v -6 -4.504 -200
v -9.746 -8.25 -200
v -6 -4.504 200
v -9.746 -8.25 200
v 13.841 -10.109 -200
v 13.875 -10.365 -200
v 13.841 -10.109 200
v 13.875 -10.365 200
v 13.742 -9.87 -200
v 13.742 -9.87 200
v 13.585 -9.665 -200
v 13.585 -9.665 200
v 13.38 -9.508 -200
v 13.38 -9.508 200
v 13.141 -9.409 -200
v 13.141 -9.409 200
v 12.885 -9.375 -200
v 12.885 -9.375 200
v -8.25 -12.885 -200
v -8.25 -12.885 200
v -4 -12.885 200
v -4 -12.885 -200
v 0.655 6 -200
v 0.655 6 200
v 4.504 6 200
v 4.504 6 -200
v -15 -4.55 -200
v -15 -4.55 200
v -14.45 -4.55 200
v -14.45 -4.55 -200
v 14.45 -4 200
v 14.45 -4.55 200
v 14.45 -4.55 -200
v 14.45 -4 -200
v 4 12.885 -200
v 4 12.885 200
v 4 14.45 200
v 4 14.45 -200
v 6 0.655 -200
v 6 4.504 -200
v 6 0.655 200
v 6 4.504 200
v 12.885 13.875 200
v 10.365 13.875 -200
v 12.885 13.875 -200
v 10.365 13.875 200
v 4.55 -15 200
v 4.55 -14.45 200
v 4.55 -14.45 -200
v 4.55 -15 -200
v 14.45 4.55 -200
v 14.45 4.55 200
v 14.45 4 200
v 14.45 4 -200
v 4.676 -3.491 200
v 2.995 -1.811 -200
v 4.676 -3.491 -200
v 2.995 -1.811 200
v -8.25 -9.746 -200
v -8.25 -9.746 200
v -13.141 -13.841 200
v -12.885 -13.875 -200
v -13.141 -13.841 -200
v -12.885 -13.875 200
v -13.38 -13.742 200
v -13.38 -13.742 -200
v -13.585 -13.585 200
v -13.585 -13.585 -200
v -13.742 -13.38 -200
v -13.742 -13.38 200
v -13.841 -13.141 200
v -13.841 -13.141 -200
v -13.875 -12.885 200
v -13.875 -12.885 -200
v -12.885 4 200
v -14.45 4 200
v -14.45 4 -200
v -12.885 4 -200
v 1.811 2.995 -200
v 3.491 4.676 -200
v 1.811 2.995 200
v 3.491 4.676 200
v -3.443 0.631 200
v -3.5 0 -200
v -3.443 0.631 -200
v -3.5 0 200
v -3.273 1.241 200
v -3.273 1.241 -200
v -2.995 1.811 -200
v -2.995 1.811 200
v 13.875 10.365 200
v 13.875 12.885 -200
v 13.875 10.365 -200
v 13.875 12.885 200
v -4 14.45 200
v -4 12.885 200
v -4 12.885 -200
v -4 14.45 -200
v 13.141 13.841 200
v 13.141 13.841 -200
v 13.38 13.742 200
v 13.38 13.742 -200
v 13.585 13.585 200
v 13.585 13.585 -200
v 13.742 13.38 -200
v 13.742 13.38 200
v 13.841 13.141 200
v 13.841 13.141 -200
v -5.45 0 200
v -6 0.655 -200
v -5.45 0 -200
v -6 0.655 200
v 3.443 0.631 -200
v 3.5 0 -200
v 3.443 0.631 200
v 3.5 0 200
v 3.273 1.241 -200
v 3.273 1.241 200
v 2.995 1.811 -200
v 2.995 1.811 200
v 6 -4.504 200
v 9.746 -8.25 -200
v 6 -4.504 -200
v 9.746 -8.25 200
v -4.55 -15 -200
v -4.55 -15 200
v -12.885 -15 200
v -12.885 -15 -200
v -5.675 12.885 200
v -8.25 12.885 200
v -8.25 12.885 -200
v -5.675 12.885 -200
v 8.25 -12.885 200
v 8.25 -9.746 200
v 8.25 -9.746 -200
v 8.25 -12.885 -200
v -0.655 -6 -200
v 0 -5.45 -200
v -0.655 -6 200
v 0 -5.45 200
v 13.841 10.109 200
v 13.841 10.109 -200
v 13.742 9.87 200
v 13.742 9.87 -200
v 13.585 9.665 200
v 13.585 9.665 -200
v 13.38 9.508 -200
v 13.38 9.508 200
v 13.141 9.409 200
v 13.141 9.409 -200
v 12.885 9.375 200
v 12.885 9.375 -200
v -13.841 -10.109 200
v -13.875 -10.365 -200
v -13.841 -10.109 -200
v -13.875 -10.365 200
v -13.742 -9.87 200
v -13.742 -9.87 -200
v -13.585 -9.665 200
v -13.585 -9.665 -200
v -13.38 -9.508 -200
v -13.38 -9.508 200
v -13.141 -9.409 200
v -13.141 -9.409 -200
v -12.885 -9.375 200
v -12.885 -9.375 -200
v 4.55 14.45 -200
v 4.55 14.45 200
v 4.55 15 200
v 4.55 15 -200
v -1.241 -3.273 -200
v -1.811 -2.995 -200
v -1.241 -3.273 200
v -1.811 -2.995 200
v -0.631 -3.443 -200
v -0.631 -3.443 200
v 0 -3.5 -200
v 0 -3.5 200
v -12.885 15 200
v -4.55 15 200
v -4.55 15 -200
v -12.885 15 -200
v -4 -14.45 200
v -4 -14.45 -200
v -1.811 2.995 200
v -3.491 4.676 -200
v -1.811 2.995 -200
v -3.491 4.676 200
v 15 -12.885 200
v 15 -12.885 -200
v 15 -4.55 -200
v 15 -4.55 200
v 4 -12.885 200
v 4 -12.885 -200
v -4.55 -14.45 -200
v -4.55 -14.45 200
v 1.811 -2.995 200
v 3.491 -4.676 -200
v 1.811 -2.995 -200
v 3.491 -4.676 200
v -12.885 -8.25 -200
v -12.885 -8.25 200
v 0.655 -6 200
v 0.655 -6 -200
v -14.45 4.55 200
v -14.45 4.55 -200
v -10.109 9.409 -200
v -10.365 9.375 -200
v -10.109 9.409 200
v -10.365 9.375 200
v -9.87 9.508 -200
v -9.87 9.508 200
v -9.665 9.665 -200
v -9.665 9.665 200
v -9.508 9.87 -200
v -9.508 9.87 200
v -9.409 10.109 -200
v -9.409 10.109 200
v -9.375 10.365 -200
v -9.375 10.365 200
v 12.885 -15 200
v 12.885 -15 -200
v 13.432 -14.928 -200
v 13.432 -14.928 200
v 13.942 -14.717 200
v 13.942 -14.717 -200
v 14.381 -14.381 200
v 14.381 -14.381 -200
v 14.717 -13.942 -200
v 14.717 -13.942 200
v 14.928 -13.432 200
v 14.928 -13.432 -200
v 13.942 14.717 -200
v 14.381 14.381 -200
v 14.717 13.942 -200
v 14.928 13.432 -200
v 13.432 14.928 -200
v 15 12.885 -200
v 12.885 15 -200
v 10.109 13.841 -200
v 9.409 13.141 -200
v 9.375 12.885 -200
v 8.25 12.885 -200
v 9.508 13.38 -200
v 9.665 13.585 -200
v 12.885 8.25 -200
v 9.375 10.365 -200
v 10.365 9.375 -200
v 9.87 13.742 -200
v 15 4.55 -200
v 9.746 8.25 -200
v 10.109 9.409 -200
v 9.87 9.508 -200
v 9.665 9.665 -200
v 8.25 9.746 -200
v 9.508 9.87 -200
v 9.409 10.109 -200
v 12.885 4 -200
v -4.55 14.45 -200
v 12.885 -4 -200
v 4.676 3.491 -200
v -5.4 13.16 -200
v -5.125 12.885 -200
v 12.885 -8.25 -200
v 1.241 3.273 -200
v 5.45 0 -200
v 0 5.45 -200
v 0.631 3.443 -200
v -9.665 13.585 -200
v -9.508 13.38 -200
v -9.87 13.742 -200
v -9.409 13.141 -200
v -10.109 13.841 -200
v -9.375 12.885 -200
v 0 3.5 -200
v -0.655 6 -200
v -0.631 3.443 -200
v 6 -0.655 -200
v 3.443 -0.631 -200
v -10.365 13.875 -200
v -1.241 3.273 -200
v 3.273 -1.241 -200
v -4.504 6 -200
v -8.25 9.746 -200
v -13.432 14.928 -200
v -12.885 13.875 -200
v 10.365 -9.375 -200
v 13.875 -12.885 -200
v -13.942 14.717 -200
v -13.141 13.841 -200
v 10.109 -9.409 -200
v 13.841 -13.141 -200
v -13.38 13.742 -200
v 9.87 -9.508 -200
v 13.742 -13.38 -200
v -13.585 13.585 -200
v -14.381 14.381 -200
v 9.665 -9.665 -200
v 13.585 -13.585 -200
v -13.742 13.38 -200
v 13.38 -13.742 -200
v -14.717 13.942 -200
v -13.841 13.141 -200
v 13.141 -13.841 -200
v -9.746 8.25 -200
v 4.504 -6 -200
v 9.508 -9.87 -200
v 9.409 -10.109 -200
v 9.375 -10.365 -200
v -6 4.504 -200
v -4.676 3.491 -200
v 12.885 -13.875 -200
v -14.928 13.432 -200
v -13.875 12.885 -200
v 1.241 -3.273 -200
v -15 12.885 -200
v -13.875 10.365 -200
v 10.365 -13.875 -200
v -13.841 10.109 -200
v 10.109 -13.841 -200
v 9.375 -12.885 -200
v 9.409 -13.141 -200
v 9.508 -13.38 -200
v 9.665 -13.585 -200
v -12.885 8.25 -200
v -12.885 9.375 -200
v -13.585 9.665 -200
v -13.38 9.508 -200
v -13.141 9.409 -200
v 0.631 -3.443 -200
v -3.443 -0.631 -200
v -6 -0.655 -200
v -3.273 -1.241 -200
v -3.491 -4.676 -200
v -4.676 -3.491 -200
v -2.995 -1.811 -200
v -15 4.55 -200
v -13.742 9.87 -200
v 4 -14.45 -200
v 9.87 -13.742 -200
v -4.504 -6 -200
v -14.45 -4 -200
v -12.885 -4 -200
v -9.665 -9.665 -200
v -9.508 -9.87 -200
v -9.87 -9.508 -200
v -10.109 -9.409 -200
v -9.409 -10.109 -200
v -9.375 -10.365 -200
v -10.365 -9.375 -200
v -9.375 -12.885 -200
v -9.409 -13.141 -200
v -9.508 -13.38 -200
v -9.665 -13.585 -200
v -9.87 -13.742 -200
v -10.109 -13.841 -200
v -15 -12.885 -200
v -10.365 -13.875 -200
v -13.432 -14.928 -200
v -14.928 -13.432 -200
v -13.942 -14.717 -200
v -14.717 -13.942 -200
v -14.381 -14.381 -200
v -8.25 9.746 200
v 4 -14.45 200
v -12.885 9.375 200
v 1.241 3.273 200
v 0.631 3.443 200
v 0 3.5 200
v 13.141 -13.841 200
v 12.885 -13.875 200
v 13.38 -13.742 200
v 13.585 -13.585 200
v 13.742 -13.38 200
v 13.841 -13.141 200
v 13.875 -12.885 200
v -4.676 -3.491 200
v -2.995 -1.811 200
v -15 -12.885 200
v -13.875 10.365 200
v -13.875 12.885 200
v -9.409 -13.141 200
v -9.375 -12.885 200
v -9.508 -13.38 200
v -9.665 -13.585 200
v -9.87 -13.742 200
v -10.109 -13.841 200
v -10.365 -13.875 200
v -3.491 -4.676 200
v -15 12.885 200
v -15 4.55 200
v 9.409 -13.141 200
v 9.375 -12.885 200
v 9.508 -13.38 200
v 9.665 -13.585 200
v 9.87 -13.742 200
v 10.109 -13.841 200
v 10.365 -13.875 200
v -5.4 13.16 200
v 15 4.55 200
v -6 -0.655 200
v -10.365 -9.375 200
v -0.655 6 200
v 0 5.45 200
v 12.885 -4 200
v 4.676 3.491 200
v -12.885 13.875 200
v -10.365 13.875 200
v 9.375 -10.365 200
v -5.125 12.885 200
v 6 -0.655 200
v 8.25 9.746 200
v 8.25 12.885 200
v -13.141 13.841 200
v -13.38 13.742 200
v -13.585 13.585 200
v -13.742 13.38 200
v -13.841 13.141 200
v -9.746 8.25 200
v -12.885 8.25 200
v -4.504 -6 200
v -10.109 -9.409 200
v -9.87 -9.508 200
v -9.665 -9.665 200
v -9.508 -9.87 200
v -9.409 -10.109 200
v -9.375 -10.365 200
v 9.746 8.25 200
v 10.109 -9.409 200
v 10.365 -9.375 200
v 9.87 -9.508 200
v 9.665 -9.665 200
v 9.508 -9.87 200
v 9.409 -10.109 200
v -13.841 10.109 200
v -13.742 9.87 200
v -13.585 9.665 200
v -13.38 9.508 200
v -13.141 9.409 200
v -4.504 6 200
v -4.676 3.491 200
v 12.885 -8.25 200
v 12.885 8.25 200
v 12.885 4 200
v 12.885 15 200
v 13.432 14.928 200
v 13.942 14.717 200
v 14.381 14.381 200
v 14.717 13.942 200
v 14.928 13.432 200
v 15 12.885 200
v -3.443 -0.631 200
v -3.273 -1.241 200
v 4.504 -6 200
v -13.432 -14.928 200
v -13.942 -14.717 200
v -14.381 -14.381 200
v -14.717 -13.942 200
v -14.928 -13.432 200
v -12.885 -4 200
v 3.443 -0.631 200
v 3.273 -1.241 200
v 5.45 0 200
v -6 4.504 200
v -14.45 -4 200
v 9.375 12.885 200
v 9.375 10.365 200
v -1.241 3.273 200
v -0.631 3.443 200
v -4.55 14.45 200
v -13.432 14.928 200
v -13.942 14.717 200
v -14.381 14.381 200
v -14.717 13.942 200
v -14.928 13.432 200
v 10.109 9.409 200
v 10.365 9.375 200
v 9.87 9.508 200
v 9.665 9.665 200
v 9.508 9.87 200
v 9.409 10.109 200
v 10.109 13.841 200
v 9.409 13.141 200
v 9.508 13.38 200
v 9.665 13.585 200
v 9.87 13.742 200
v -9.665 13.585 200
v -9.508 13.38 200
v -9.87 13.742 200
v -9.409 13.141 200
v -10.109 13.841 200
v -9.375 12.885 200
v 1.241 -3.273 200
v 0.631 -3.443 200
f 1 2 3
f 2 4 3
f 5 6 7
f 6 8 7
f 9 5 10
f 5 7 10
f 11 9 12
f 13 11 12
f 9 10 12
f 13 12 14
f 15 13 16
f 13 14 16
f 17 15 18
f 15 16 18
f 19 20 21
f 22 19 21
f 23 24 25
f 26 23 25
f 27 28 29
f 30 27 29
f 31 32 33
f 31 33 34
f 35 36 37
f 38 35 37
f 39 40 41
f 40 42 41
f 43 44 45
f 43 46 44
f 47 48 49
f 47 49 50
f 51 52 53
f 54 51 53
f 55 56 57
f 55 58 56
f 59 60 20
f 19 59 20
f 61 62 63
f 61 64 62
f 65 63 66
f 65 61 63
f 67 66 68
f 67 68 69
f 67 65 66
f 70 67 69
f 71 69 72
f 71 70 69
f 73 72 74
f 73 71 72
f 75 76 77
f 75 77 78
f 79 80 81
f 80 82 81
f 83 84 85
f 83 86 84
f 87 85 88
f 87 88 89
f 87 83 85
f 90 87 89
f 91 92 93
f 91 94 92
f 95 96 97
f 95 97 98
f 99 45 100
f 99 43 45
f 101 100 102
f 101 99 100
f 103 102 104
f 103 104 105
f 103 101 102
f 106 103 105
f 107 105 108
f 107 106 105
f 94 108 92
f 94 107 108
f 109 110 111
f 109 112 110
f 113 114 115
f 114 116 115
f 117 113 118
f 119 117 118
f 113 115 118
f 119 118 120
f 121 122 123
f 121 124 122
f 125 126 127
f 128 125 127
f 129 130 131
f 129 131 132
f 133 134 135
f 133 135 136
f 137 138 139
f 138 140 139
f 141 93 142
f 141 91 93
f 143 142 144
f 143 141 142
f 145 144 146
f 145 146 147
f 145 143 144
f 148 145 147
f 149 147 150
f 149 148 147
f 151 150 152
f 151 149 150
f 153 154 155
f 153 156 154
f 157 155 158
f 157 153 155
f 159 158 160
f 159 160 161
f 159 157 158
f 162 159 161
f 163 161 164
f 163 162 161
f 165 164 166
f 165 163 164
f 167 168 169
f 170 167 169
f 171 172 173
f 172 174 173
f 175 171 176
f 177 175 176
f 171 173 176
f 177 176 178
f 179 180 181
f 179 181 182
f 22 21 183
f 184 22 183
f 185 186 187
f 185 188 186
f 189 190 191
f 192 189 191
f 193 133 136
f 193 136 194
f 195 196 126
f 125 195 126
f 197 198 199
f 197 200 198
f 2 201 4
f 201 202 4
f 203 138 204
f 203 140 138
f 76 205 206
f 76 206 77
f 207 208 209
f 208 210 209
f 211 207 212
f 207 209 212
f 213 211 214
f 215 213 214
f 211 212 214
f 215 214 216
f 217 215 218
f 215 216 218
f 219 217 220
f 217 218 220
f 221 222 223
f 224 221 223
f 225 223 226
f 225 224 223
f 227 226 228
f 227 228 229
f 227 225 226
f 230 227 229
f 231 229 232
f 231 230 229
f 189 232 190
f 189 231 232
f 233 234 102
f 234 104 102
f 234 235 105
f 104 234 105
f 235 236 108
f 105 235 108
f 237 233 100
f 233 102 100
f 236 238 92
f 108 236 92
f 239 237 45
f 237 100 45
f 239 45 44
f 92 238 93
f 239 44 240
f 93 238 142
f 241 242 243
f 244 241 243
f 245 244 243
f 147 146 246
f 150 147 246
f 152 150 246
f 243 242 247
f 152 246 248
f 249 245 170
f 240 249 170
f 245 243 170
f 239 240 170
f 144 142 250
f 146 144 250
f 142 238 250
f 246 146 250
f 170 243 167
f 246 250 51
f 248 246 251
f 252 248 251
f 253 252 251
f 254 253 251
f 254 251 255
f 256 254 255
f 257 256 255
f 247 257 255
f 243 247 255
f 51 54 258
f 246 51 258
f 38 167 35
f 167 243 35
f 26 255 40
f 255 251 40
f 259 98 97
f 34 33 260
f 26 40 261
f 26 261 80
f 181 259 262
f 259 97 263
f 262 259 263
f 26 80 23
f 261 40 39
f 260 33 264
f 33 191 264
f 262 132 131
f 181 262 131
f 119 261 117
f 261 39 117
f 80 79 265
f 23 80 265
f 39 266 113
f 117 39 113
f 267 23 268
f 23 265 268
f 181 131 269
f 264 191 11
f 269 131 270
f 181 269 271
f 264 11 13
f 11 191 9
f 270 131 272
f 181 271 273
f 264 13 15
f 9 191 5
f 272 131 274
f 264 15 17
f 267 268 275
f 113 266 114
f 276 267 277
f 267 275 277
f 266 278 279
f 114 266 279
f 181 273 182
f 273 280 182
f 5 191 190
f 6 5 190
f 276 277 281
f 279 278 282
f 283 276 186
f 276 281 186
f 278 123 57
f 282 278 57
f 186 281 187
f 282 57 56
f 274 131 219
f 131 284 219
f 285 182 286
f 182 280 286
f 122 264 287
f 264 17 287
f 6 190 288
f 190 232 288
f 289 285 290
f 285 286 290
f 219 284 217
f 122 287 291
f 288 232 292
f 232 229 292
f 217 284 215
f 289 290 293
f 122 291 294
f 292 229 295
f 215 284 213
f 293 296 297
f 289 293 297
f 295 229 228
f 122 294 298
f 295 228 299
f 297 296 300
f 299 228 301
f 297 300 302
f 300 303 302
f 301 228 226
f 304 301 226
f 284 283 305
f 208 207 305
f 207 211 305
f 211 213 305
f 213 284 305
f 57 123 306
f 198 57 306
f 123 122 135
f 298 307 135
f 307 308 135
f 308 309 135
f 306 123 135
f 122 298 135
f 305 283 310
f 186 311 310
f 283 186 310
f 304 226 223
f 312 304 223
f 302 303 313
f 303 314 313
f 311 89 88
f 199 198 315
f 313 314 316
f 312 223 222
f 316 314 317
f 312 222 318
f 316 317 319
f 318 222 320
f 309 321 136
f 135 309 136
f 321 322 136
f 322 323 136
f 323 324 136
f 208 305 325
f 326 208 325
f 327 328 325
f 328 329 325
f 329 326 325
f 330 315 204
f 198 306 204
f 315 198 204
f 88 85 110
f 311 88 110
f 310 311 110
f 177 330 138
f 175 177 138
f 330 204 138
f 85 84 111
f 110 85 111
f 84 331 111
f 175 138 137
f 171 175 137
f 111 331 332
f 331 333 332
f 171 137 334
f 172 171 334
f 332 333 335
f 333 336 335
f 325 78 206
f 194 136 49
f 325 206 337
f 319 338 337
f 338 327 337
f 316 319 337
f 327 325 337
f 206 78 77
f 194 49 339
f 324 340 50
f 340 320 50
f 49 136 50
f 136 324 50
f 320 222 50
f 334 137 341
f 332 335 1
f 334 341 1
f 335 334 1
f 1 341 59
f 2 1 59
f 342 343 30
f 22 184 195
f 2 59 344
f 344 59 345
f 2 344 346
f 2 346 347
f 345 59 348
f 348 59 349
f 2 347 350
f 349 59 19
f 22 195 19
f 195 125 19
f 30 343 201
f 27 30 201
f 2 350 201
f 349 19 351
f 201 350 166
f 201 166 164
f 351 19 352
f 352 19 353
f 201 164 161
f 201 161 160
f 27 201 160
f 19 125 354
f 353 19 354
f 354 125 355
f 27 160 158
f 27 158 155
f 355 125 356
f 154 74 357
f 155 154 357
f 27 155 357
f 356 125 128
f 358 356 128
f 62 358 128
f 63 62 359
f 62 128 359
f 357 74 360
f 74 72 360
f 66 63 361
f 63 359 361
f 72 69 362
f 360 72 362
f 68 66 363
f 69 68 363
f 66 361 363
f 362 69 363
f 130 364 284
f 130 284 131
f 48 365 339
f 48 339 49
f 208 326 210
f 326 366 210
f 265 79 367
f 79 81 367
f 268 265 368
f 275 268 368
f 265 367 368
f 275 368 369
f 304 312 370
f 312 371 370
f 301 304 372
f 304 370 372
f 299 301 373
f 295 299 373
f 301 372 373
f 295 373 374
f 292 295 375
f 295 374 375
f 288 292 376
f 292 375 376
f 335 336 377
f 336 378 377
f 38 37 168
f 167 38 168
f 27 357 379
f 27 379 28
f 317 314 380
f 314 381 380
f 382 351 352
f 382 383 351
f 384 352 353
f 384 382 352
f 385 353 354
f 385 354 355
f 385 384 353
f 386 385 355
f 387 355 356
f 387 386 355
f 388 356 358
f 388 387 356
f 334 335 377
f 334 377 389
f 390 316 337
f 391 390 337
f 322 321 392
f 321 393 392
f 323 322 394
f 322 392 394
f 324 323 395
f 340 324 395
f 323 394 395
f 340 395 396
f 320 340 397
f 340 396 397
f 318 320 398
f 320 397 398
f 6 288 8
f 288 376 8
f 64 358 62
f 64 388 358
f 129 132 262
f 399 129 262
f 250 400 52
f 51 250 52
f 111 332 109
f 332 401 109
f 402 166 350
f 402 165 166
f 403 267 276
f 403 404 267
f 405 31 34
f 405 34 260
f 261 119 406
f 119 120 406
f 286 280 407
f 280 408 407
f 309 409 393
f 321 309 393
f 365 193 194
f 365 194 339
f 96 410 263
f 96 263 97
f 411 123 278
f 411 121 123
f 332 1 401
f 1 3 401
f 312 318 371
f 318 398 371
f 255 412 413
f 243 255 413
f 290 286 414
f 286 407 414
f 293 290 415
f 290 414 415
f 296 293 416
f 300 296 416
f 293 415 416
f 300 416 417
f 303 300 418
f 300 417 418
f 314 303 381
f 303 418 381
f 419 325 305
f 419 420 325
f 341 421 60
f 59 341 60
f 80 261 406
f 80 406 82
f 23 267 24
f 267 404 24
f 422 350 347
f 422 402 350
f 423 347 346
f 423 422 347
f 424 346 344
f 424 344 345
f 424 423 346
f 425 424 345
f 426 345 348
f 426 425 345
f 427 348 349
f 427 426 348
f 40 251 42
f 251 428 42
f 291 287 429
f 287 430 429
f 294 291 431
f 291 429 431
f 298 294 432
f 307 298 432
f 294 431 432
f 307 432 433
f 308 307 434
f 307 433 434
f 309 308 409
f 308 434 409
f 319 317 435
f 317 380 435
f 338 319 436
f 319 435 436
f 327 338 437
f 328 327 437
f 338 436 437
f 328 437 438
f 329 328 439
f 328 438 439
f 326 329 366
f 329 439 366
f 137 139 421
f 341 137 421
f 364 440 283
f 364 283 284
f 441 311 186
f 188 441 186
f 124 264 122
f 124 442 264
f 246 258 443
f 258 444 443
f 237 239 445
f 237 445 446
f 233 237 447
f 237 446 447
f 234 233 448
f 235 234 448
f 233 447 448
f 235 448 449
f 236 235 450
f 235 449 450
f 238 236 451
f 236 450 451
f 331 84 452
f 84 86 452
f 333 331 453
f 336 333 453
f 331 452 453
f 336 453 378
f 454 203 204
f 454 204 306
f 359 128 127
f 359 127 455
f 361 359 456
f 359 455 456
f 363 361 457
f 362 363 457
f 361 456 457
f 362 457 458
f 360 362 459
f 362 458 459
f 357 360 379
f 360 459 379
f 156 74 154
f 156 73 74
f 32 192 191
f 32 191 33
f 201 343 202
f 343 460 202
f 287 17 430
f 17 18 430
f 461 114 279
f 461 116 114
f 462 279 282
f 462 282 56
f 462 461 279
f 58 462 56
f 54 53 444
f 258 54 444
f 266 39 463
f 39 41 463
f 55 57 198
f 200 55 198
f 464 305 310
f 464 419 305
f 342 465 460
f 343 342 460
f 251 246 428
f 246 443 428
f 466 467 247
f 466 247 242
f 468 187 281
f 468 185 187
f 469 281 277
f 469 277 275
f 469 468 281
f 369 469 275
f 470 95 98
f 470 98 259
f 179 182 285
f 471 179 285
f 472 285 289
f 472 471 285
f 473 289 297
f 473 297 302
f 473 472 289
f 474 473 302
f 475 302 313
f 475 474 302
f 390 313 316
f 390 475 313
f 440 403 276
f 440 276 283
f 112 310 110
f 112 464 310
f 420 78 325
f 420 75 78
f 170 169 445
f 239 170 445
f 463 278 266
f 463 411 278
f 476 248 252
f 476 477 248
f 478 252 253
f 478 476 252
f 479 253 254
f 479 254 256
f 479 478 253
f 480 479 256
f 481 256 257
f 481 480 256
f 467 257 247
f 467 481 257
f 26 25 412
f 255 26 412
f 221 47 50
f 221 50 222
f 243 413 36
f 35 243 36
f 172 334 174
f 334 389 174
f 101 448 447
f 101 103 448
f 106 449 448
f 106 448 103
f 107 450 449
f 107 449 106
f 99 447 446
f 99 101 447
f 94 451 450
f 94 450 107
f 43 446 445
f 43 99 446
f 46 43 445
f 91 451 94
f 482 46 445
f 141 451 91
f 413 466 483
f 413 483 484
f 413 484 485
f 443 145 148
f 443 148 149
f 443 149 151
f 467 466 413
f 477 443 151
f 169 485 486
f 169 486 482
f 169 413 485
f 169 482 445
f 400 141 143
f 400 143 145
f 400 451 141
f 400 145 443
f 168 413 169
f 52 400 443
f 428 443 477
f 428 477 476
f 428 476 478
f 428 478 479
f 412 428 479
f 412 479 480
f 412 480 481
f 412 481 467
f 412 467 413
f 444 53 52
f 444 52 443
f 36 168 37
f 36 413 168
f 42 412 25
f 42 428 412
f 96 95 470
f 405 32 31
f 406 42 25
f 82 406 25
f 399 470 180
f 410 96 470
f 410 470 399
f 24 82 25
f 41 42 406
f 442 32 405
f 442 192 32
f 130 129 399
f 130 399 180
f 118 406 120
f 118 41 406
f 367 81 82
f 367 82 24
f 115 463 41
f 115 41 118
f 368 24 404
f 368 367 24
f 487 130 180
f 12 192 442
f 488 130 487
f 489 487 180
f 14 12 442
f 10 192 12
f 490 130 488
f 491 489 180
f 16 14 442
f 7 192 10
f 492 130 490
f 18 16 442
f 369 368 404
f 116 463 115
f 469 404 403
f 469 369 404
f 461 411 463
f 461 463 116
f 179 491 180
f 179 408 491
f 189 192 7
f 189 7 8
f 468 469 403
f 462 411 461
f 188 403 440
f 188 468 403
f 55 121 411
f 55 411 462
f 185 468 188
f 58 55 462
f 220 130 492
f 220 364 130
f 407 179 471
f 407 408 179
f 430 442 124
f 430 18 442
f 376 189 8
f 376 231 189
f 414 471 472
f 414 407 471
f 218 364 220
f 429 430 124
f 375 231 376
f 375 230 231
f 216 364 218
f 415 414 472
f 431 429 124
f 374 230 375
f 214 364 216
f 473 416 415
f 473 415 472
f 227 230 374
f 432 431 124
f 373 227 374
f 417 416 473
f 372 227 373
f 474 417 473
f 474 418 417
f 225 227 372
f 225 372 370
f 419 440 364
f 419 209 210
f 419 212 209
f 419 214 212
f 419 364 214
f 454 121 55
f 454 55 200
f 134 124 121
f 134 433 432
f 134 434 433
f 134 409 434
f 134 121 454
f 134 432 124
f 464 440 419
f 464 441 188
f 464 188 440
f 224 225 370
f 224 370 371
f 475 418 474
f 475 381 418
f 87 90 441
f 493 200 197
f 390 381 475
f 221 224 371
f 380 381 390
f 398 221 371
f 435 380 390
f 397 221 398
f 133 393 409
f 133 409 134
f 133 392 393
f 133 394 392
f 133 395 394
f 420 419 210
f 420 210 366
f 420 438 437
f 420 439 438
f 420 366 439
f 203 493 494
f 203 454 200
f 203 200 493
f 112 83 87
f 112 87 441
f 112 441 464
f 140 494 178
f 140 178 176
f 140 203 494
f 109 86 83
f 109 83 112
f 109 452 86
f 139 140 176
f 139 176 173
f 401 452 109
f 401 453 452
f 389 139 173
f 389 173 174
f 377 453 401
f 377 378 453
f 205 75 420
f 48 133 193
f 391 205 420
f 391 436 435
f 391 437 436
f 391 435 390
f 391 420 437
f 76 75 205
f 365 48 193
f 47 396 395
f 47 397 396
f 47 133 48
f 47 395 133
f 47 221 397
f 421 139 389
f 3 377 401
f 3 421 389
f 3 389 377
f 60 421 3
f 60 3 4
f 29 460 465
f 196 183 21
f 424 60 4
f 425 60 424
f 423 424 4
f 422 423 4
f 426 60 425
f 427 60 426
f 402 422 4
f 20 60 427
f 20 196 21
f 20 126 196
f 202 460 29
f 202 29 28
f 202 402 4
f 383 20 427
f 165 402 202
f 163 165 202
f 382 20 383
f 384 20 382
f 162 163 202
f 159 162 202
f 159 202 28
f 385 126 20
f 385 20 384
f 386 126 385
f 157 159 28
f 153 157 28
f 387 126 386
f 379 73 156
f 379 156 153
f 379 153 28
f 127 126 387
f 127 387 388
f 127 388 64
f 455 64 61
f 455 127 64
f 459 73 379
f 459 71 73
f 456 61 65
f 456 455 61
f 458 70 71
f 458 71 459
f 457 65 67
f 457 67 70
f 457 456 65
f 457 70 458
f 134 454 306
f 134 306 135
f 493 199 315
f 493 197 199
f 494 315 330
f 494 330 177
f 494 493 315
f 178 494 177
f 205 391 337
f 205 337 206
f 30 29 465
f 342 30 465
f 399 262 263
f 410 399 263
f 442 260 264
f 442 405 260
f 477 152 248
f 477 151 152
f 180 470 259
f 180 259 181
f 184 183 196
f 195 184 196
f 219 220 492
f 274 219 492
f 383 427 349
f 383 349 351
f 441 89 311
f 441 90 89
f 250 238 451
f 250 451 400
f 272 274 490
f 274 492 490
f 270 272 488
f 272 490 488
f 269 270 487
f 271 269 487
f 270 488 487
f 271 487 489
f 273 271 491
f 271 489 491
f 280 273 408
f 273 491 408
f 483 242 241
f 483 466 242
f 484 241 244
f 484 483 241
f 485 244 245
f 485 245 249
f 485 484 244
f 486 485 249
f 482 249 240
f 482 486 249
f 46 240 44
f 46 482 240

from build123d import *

# Parameters (mm, degrees)
BOSS_EXTRUDE1_DEPTH     = 200
CUT_EXTRUDE1_DEPTH      = 1
CUT_EXTRUDE1_DEPTH_BACK = 401


with BuildPart() as part:
    # Sketch4 → Boss-Extrude1 (new body, symmetric)
    with BuildSketch(Plane.XY):
        with BuildLine():
            Line((0, -5.45), (0.655464476, -6))
            Line((0.655464476, -6), (4.504469158, -6))
            Line((4.504469158, -6), (8.25, -9.745530842))
            Line((8.25, -9.745530842), (8.25, -12.885))
            Line((8.25, -12.885), (4, -12.885))
            Line((4, -12.885), (4, -14.45))
            Line((4, -14.45), (4.55, -14.45))
            Line((4.55, -14.45), (4.55, -15))
            Line((4.55, -15), (12.885, -15))
            ThreePointArc((12.885, -15), (14.380530842, -14.380530842), (15, -12.885))
            Line((15, -12.885), (15, -4.55))
            Line((15, -4.55), (14.45, -4.55))
            Line((14.45, -4.55), (14.45, -4))
            Line((14.45, -4), (12.885, -4))
            Line((12.885, -4), (12.885, -8.25))
            Line((12.885, -8.25), (9.745530842, -8.25))
            Line((9.745530842, -8.25), (6, -4.504469158))
            Line((6, -4.504469158), (6, -0.655464476))
            Line((6, -0.655464476), (5.45, 0))
            Line((5.45, 0), (3.5, 0))
            ThreePointArc((3.5, 0), (3.371433308, -0.939913534), (2.995178599, -1.81077474))
            Line((2.995178599, -1.81077474), (4.675743591, -3.491339732))
            Line((4.675743591, -3.491339732), (3.491339732, -4.675743591))
            Line((3.491339732, -4.675743591), (1.81077474, -2.995178599))
            ThreePointArc((1.81077474, -2.995178599), (0.939913534, -3.371433308), (0, -3.5))
            Line((0, -3.5), (0, -5.45))
        make_face()
        with BuildLine():
            Line((9.375, -10.365), (9.375, -12.885))
            ThreePointArc((9.375, -12.885), (9.664964287, -13.585035713), (10.365, -13.875))
            Line((10.365, -13.875), (12.885, -13.875))
            ThreePointArc((12.885, -13.875), (13.585035713, -13.585035713), (13.875, -12.885))
            Line((13.875, -12.885), (13.875, -10.365))
            ThreePointArc((13.875, -10.365), (13.585035713, -9.664964287), (12.885, -9.375))
            Line((12.885, -9.375), (10.365, -9.375))
            ThreePointArc((10.365, -9.375), (9.664964287, -9.664964287), (9.375, -10.365))
        make_face(mode=Mode.SUBTRACT)
    extrude(amount=BOSS_EXTRUDE1_DEPTH, both=True)

    # Mirror1: part across plane


with BuildPart() as part_1:
    add(part.part)
    add(part.part.mirror(Plane(origin=(0, 0, 0), x_dir=(0, 0, 1), z_dir=(1, 0, 0))))

    # Mirror2: part across plane


with BuildPart() as part_2:
    add(part_1.part)
    add(part_1.part.mirror(Plane.ZX))

    # Sketch5 → Cut-Extrude1 (cut, two sides)
    with BuildSketch(Plane.XY.offset(200)) as cut_extrude1_sk:
        Polygon((-5.675, 12.885), (-5.4, 13.16), (-5.125, 12.885), align=None)
    extrude(amount=CUT_EXTRUDE1_DEPTH, mode=Mode.SUBTRACT)
    extrude(cut_extrude1_sk.sketch, amount=-CUT_EXTRUDE1_DEPTH_BACK, mode=Mode.SUBTRACT)


solid = part_2.part
